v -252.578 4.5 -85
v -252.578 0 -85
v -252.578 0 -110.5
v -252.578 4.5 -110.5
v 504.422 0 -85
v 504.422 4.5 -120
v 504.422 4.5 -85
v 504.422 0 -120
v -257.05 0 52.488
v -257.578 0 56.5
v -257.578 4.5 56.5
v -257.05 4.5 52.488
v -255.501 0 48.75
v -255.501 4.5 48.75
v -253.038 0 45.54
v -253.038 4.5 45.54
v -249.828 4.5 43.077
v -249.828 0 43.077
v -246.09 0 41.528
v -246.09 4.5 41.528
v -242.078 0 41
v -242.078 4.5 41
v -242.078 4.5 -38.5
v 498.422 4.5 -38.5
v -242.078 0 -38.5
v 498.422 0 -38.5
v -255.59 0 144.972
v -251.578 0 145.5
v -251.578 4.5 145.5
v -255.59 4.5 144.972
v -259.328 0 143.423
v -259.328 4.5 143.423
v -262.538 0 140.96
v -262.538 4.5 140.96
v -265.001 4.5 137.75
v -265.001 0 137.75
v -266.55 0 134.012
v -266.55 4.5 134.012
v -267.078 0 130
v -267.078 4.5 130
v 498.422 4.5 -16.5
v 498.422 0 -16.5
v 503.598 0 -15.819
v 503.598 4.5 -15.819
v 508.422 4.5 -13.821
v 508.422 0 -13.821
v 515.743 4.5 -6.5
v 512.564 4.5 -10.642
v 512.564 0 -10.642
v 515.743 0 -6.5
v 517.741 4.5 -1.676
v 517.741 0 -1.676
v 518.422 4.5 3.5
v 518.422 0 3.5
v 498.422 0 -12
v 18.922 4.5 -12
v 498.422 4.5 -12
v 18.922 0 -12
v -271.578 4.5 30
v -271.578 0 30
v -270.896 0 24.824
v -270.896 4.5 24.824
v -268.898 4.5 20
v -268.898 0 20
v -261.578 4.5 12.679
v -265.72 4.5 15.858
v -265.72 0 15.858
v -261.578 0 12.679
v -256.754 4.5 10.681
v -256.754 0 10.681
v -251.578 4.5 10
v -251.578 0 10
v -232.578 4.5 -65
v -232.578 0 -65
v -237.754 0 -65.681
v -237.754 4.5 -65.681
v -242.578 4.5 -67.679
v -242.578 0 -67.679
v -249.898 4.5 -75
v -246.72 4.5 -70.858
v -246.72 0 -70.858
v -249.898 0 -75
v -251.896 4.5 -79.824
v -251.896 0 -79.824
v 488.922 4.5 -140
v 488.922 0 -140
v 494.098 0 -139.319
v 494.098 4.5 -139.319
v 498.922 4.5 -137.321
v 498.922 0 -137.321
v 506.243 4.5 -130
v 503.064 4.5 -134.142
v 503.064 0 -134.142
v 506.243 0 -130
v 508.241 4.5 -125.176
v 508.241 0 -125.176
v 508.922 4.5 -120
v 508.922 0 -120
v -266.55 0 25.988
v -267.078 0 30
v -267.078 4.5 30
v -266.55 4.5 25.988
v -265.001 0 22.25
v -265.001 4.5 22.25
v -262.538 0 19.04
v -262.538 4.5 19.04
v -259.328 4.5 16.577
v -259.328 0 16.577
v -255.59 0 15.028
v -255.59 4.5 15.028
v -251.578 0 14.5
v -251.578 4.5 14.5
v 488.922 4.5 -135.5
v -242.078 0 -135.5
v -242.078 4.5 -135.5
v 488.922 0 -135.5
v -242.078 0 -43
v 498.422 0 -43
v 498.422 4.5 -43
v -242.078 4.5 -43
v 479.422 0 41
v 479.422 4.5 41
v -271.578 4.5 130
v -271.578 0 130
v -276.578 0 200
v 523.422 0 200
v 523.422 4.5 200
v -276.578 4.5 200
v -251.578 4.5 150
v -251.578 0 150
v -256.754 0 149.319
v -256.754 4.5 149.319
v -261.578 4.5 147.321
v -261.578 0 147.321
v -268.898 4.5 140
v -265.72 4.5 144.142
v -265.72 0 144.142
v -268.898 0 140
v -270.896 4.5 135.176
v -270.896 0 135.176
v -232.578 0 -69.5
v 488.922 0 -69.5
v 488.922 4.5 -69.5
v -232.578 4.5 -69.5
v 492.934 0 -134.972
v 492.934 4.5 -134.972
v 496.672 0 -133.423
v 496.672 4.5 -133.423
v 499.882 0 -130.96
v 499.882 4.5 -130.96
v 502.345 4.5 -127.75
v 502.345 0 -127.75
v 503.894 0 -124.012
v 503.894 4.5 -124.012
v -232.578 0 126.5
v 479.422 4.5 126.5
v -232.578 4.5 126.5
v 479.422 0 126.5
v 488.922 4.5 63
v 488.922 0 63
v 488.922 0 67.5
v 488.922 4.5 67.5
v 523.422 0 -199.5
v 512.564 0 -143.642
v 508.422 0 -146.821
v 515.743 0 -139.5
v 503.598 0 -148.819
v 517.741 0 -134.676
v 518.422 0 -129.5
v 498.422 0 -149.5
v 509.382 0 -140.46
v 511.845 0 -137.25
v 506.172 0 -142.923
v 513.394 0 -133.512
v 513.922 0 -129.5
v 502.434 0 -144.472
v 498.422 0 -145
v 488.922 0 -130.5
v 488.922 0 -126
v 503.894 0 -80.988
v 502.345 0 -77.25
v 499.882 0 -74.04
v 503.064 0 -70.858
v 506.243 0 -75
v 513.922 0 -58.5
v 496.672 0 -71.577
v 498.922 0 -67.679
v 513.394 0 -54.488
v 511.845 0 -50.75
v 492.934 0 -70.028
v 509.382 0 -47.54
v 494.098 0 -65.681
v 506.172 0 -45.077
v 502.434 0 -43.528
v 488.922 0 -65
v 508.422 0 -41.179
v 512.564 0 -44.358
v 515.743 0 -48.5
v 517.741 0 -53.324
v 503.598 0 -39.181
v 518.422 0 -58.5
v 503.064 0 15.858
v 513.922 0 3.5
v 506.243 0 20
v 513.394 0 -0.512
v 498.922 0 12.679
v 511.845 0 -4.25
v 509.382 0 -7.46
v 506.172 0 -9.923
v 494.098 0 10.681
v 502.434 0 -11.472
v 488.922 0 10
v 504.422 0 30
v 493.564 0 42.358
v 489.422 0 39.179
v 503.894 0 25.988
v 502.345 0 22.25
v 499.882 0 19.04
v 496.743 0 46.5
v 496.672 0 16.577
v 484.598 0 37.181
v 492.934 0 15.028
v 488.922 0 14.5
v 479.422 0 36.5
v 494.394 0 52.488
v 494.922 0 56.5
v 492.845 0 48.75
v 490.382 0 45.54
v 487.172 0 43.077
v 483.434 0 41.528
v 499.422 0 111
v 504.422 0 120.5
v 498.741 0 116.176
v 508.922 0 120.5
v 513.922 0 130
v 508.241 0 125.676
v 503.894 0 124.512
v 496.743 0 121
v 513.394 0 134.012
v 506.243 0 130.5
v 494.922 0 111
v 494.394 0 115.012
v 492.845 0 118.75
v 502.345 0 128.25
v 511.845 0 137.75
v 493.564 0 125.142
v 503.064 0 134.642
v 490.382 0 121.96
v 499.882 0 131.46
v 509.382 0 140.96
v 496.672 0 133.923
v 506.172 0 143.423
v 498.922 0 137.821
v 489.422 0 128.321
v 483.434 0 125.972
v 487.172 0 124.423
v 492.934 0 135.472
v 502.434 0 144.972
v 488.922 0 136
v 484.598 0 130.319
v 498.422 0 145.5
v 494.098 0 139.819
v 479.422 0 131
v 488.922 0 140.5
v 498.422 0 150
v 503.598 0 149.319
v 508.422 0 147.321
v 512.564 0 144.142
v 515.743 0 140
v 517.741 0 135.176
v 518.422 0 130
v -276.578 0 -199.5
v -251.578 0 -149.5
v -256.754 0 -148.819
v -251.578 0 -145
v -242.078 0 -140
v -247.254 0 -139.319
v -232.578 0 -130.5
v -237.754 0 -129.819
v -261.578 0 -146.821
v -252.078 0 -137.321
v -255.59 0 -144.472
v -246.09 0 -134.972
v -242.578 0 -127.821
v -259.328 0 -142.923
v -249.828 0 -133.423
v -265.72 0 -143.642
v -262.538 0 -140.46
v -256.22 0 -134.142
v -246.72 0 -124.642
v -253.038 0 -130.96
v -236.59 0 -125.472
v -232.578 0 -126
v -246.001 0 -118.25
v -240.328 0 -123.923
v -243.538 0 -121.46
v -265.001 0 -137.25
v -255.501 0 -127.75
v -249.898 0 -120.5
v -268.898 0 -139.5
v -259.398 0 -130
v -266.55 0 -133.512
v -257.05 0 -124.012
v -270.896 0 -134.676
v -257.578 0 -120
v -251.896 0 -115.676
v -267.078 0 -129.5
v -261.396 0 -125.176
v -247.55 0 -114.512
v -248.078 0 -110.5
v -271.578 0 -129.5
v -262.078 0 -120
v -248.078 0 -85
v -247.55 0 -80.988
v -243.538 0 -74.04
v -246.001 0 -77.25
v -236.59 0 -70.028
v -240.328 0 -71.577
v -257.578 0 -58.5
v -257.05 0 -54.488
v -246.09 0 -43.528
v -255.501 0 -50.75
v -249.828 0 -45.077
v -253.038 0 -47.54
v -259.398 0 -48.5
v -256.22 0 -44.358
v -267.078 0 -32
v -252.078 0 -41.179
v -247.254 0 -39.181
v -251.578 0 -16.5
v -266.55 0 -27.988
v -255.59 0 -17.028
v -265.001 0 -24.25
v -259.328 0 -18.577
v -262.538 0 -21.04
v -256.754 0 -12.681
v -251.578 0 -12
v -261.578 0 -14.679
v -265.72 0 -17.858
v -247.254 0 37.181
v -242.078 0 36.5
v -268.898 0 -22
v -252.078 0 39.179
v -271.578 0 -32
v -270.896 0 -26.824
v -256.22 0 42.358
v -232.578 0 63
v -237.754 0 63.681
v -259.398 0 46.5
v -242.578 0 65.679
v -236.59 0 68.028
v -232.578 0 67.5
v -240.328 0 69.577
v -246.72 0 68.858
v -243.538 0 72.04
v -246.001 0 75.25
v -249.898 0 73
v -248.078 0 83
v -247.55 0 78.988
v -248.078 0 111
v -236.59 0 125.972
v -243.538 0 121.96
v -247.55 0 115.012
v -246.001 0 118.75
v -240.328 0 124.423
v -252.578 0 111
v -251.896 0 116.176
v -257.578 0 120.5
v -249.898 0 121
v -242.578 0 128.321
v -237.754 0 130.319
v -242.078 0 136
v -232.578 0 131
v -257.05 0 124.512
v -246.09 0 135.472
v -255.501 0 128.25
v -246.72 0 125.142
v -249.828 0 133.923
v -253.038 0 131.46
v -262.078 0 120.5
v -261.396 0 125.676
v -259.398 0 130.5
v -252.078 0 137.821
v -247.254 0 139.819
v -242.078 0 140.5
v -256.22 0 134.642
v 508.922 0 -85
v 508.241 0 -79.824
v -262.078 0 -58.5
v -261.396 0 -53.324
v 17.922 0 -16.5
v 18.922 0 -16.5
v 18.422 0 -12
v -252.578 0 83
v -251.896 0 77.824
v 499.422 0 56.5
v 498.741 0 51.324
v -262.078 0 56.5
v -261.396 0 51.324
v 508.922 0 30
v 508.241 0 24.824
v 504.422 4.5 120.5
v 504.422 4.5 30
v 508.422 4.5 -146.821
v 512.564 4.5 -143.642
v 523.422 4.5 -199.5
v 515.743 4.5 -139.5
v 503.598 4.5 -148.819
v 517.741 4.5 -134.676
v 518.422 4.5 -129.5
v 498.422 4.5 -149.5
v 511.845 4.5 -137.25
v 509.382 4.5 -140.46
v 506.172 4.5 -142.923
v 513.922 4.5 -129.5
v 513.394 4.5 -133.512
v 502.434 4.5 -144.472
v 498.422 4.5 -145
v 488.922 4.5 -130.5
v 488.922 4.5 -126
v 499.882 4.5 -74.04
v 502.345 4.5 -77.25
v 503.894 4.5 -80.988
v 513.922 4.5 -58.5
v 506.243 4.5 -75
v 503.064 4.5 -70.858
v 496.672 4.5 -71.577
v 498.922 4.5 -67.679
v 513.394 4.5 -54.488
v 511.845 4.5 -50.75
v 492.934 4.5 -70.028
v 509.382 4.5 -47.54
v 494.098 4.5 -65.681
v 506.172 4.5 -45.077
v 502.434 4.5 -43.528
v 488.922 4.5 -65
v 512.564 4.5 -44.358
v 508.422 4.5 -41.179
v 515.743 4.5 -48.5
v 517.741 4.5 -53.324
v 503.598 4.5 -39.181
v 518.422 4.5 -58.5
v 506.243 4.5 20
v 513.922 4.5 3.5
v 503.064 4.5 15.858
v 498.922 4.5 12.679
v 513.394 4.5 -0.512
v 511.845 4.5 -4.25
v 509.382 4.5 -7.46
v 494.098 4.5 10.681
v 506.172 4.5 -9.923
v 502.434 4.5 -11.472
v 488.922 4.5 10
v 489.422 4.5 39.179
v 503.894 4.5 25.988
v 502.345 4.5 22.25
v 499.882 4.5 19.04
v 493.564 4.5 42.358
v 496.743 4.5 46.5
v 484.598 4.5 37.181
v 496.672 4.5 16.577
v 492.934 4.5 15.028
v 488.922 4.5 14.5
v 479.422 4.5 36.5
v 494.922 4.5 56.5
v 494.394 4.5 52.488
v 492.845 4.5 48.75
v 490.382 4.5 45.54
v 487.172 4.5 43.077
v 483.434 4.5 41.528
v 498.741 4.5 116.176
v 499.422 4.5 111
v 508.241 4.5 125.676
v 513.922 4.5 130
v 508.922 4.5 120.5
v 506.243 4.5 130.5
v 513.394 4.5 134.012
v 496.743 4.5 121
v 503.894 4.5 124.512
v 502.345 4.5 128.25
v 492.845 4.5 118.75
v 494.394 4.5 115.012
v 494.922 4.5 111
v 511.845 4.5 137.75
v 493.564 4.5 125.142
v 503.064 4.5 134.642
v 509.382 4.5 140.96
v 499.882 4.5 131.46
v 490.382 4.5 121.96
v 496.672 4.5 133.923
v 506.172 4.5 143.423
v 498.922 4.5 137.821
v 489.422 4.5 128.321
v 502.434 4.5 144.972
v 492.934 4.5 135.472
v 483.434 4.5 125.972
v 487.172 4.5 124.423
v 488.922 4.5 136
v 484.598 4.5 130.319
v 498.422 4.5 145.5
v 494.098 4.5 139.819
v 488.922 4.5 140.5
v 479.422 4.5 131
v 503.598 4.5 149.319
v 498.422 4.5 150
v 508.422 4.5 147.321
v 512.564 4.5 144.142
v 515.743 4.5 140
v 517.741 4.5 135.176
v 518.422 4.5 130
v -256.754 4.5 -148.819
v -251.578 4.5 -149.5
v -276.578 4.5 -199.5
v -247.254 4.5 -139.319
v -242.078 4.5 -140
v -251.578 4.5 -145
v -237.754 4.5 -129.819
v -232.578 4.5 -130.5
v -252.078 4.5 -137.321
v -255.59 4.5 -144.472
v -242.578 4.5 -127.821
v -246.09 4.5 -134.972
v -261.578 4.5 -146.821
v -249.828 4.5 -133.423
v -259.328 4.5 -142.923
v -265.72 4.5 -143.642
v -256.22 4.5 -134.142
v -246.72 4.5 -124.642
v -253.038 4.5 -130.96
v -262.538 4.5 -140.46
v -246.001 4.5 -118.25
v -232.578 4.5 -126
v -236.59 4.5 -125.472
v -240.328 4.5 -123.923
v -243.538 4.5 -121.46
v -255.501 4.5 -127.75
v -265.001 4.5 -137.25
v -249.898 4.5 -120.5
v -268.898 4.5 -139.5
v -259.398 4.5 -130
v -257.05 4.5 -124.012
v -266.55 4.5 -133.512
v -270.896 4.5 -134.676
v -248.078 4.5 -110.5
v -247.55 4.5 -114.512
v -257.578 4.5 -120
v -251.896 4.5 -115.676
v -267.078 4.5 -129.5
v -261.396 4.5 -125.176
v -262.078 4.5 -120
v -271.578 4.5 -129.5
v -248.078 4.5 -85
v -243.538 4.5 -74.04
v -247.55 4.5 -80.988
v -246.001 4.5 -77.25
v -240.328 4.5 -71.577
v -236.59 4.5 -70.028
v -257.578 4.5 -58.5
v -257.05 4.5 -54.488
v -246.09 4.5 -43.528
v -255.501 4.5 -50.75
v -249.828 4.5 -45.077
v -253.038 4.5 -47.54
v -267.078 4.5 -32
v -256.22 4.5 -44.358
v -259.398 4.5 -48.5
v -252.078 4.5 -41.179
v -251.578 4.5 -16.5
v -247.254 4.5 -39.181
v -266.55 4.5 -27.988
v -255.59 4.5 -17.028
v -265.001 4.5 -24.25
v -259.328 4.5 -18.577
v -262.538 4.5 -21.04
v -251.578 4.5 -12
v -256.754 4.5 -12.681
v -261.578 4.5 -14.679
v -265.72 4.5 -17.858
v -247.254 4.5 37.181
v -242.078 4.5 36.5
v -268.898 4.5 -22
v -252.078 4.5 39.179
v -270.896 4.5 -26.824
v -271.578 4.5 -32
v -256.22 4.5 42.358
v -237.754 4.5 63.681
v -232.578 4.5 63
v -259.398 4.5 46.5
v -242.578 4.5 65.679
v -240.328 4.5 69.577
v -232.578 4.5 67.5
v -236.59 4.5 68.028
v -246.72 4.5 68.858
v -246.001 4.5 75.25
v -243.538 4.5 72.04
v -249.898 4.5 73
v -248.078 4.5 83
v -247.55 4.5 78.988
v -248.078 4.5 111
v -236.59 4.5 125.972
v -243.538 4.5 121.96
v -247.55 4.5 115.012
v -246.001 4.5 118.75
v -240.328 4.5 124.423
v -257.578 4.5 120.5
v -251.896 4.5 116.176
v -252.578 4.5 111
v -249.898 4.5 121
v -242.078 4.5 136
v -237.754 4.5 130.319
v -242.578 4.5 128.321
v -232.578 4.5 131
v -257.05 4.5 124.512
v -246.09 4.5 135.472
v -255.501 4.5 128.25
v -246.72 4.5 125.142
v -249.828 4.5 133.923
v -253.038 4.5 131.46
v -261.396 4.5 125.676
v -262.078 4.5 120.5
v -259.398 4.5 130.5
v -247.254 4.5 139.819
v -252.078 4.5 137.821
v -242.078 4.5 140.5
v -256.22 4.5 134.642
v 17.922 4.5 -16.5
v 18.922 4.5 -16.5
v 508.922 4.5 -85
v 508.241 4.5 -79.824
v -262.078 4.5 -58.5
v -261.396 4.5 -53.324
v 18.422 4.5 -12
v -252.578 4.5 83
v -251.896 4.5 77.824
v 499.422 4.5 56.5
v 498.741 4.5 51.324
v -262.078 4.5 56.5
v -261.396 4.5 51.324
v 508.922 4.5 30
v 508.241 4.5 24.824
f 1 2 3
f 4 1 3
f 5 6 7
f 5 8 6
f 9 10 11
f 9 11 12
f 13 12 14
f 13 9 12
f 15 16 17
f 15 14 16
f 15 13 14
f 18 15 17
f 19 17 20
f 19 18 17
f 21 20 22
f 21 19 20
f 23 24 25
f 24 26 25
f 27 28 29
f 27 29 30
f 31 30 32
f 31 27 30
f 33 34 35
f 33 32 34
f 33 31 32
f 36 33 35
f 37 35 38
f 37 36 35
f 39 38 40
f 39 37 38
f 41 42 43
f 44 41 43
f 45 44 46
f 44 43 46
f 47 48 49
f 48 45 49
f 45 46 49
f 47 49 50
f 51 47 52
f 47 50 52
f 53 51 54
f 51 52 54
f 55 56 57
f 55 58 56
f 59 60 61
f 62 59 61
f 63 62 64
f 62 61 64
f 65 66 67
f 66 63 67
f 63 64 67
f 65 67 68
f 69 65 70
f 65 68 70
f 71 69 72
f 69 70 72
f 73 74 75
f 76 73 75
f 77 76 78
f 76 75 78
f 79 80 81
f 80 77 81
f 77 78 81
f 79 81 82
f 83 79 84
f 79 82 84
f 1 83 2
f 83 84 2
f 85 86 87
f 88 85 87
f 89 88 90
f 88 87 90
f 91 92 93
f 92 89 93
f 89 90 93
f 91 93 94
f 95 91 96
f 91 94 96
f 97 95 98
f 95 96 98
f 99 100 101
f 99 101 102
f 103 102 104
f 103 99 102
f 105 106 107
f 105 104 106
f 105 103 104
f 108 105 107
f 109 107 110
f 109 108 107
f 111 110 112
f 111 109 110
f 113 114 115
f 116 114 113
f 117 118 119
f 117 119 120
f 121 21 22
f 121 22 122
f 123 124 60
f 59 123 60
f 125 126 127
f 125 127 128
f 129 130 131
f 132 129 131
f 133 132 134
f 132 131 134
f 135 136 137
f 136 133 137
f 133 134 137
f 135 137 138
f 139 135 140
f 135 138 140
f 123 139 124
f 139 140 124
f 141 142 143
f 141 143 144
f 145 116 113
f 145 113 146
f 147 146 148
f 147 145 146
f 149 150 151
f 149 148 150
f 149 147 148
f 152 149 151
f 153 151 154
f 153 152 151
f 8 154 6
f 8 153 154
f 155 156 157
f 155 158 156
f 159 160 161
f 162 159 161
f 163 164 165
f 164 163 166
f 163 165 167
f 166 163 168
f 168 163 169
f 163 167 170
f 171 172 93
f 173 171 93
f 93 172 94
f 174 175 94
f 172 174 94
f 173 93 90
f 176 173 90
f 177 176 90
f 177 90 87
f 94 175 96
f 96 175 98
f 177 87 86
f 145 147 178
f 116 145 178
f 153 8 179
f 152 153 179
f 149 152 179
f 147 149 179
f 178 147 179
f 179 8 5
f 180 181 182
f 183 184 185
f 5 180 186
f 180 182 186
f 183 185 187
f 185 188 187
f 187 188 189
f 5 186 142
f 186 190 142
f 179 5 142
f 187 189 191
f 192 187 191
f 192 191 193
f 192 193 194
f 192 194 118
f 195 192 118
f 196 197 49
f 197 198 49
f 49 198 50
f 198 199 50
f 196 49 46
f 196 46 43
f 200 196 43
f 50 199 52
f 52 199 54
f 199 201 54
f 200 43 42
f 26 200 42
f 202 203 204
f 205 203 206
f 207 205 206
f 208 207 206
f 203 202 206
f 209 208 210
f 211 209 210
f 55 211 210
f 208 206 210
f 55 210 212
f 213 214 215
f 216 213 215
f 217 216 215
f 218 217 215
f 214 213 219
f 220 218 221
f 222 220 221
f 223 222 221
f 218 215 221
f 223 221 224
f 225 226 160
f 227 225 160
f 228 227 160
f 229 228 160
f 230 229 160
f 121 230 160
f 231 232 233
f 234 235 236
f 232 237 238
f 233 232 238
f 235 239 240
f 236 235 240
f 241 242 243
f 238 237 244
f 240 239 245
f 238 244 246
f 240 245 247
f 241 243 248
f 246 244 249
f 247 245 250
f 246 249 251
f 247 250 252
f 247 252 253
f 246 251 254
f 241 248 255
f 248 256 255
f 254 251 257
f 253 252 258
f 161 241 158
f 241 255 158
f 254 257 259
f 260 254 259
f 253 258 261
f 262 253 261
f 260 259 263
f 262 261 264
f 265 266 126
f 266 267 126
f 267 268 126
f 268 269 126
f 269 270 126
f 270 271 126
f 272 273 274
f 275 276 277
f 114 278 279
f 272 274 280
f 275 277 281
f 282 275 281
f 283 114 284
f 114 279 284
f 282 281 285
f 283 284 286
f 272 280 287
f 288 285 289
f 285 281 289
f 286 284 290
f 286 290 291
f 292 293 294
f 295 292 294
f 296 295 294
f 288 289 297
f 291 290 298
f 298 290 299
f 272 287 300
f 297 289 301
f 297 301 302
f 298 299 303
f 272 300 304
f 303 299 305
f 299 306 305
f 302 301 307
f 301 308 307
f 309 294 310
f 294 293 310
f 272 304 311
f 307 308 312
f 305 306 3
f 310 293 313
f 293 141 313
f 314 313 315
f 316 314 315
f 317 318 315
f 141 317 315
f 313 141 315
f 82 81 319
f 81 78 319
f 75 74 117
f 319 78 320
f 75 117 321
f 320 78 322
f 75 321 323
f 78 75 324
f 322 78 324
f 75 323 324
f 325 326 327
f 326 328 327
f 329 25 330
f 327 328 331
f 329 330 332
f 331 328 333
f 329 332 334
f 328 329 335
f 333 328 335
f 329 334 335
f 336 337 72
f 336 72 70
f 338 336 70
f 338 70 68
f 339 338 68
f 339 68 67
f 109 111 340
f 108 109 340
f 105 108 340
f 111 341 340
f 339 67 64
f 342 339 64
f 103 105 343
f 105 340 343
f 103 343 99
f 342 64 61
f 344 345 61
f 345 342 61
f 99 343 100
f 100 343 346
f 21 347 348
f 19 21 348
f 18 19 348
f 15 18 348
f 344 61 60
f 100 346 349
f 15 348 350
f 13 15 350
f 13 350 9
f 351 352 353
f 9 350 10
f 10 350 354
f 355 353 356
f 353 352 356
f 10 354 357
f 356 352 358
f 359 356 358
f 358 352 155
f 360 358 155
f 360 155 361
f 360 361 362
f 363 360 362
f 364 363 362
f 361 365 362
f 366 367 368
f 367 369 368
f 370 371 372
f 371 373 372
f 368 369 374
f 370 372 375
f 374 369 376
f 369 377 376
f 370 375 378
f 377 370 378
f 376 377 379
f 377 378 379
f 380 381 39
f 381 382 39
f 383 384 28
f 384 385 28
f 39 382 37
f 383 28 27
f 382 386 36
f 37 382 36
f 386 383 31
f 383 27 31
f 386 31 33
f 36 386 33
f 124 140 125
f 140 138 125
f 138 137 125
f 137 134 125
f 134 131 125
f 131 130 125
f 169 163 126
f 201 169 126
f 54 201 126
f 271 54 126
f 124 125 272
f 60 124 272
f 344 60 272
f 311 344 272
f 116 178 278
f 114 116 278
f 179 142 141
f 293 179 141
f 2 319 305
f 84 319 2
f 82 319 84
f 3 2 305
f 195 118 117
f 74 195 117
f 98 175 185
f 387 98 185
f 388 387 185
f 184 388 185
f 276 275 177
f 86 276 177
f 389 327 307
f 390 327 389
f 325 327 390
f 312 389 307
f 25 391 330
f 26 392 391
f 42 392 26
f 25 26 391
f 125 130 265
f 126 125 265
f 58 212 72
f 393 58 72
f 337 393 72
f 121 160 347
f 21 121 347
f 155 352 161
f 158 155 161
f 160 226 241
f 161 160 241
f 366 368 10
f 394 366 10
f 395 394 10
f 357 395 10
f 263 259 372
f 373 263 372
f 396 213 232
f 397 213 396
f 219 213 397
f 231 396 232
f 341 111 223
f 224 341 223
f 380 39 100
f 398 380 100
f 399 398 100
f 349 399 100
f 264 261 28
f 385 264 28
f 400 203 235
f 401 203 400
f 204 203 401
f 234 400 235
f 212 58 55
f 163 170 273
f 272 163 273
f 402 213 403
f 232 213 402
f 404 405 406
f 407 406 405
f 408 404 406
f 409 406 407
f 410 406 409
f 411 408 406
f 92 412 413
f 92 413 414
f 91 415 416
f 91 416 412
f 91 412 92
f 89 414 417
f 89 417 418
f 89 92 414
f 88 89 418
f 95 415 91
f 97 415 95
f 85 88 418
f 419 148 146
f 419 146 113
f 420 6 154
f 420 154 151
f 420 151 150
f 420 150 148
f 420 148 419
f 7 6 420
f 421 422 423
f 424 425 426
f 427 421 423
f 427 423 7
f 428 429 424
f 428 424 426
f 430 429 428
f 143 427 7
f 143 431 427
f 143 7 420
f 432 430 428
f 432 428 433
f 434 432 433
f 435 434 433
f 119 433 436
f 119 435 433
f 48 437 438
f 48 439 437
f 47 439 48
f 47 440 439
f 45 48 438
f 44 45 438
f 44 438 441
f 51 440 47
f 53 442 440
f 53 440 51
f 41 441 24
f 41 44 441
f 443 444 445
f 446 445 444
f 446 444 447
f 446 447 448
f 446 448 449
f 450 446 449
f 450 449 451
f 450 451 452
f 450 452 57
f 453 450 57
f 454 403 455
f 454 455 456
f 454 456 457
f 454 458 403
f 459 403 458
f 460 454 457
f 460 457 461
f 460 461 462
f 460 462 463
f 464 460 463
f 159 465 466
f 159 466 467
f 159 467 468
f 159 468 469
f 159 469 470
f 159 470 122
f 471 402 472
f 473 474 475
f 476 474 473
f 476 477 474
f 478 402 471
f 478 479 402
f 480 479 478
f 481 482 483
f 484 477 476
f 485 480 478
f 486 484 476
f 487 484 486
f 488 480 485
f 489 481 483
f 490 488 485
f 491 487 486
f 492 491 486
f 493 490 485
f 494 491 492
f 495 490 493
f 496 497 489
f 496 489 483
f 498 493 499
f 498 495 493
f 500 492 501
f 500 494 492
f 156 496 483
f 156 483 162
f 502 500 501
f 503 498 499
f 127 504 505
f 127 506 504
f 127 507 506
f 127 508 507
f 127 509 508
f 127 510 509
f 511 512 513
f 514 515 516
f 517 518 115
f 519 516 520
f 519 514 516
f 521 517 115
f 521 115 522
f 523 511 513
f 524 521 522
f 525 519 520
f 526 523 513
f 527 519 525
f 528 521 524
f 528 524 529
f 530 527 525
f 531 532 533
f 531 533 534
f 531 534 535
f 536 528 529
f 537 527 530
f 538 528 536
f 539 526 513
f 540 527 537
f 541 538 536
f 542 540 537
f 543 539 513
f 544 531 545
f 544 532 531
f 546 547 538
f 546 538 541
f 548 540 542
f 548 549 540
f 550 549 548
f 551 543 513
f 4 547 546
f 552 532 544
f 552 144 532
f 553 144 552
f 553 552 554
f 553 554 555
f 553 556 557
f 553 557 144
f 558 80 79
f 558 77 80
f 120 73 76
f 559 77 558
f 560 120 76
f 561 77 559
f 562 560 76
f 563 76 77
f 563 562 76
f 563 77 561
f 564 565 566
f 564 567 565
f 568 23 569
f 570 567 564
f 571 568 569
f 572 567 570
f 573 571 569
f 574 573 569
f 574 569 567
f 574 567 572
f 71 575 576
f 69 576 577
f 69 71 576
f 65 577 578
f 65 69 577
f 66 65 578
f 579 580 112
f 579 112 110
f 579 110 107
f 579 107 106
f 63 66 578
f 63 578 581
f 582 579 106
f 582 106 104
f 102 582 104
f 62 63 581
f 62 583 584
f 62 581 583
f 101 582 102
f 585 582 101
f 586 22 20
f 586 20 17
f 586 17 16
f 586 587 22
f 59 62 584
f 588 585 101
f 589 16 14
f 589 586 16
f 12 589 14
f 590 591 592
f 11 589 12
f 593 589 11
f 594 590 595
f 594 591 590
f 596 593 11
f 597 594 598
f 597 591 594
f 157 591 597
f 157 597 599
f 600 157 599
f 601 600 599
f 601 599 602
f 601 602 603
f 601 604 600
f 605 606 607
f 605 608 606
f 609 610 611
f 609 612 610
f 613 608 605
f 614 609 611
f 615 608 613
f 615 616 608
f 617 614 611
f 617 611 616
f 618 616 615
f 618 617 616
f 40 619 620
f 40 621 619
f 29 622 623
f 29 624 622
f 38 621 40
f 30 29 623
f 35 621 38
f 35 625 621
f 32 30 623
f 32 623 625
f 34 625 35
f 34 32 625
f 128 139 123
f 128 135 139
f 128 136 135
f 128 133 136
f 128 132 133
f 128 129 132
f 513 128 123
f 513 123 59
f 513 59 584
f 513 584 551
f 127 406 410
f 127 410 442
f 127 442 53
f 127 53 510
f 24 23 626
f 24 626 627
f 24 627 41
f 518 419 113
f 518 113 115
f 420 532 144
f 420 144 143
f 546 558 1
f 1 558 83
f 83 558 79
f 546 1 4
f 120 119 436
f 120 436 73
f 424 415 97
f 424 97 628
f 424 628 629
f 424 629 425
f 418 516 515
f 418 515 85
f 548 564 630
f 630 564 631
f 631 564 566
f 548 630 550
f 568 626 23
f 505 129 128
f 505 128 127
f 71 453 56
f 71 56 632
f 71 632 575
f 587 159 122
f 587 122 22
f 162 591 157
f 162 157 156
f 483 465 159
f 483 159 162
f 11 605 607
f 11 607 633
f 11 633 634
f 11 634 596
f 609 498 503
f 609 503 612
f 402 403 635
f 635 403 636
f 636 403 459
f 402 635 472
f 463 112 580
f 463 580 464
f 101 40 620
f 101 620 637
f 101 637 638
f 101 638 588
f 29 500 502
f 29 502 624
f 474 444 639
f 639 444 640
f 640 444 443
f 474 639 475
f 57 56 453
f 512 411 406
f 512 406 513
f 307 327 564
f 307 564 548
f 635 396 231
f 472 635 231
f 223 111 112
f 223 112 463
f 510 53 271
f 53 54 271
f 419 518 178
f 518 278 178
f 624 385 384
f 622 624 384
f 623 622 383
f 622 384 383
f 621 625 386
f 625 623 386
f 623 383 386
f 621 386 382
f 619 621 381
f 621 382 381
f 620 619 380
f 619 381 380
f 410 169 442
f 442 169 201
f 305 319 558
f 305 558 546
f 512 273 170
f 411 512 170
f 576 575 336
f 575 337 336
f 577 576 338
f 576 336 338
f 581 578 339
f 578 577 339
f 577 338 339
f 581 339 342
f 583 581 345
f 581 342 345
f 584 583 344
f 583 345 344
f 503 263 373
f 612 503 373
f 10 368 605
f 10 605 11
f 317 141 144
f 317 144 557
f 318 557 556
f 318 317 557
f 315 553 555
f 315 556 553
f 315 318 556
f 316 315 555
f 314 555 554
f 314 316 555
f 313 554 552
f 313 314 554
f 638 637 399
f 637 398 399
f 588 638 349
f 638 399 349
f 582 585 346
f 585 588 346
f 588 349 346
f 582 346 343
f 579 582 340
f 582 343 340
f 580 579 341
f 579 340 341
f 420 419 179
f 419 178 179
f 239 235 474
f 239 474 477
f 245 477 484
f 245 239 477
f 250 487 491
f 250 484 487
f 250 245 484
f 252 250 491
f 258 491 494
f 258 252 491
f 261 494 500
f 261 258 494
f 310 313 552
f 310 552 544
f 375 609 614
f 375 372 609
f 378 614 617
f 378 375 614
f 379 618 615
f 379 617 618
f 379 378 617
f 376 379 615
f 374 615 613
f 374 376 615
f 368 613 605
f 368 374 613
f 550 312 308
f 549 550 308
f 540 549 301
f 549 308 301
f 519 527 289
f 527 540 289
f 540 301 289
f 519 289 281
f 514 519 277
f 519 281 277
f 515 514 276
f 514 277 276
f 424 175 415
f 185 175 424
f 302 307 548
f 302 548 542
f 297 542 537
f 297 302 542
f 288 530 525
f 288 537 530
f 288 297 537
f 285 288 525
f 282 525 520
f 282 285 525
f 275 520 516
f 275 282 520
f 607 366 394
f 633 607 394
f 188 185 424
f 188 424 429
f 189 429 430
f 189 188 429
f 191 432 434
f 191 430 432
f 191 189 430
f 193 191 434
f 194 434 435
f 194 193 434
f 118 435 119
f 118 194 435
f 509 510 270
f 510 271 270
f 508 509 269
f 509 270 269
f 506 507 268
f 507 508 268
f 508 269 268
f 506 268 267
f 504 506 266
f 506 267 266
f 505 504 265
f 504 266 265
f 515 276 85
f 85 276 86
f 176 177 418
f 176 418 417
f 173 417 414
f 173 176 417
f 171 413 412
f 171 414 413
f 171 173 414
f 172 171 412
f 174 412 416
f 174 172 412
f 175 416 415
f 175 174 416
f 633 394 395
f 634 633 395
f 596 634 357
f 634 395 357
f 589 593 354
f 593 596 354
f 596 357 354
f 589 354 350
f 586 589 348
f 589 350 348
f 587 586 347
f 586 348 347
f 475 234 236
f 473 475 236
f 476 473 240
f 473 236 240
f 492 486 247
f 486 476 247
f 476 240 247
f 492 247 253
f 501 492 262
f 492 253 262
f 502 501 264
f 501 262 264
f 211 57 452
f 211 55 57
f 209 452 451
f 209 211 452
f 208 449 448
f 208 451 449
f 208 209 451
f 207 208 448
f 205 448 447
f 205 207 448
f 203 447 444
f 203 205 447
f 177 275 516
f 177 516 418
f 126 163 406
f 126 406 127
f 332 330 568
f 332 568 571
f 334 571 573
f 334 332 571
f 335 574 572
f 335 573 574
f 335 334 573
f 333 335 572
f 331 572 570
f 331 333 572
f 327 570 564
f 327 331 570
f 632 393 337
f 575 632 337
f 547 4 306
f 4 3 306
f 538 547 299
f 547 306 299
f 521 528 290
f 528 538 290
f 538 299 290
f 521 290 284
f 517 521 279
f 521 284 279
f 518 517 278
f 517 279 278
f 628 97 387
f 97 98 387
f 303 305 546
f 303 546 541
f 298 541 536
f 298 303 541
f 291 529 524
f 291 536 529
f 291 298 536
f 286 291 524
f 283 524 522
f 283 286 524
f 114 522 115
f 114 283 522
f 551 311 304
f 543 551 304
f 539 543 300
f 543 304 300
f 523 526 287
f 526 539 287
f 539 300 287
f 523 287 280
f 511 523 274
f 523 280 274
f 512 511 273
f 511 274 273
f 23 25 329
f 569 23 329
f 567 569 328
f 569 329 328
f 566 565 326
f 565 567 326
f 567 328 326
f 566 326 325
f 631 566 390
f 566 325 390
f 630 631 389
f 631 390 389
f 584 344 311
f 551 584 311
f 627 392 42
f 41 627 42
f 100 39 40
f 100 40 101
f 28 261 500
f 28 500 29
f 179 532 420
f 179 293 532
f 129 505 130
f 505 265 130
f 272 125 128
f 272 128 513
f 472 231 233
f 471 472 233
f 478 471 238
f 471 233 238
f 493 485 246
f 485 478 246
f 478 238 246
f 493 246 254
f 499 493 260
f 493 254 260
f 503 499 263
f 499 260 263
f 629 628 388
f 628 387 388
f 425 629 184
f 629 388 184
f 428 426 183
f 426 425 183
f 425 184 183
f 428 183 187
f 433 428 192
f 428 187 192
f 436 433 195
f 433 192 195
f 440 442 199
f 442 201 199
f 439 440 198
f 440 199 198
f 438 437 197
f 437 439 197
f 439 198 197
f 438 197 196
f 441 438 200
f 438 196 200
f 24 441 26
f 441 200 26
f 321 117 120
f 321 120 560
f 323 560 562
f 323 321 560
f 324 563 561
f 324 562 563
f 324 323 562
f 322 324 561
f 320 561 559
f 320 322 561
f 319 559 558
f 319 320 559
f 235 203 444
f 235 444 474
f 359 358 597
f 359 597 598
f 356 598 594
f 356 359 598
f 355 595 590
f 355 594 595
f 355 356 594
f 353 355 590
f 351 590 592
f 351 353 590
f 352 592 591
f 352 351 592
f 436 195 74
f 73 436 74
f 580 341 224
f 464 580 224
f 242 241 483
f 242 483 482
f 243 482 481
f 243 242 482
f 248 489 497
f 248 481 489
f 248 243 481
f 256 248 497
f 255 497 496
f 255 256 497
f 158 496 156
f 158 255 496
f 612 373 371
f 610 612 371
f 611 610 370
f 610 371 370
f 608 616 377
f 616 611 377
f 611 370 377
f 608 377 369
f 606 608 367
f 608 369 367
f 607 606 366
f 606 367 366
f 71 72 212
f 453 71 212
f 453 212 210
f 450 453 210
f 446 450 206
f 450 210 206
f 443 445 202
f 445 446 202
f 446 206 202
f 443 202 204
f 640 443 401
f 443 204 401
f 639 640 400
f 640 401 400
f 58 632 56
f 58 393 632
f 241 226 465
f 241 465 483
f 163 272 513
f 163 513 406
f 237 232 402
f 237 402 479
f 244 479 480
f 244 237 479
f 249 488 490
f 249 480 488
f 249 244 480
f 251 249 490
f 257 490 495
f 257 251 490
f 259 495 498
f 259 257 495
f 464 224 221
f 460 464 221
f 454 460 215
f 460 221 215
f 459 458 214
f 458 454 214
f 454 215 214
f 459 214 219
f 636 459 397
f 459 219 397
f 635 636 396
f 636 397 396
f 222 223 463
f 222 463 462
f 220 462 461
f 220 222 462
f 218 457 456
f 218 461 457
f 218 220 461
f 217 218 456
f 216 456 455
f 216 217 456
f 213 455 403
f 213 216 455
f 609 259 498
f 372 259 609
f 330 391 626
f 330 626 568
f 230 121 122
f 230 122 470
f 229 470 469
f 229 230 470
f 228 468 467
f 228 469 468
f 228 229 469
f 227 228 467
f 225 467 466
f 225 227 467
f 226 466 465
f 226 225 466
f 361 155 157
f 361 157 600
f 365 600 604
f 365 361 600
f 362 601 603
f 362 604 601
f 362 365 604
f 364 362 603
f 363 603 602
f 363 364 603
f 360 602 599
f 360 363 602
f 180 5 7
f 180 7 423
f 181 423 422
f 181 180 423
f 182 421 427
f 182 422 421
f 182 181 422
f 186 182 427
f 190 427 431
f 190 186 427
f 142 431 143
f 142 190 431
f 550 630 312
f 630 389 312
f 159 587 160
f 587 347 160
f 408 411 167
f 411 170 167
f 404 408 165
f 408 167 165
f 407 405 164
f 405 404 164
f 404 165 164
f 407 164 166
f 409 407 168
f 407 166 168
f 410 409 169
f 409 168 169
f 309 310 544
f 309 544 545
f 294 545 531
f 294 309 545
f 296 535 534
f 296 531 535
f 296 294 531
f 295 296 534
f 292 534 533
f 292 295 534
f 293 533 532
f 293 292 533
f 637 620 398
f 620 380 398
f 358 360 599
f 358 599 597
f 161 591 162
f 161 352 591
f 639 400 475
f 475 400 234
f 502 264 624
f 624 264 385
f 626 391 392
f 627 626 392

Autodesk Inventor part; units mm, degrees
ref_plane "YZ Plane" through (0, 0, 0) normal (1, 0, 0) x (0, 1, 0)
ref_plane "XZ Plane" through (0, 0, 0) normal (0, 1, 0) x (-1, 0, 0)
ref_plane "XY Plane" through (0, 0, 0) normal (0, 0, 1) x (1, 0, 0)
sketch "Sketch1" plane through (0, 0, 0) normal (0, 1, 0) x (-1, 0, 0)
  line L0 (-17.9221, -16.5) -> (-498.4221, -16.5)
  line L1 (-518.4221, 3.5) -> (-518.4221, 130)
  line L2 (-498.4221, 150) -> (251.5779, 150)
  line L3 (271.5779, 130) -> (271.5779, 30)
  line L4 (-18.4221, -12) -> (-498.4221, -12)
  line L5 (-513.9221, 3.5) -> (-513.9221, 130)
  line L6 (-498.4221, 145.5) -> (251.5779, 145.5)
  line L7 (267.0779, 130) -> (267.0779, 30)
  line L8 (251.5779, 14.5) -> (-488.9221, 14.5)
  line L9 (-504.4221, 30) -> (-504.4221, 120.5)
  line L10 (251.5779, 10) -> (-488.9221, 10)
  line L11 (-508.9221, 30) -> (-508.9221, 120.5)
  line L12 (-488.9221, 136) -> (242.0779, 136)
  line L13 (-488.9221, 140.5) -> (242.0779, 140.5)
  line L14 (257.5779, 120.5) -> (257.5779, 56.5)
  line L15 (242.0779, 41) -> (-479.4221, 41)
  line L16 (262.0779, 120.5) -> (262.0779, 56.5)
  line L17 (242.0779, 36.5) -> (-479.4221, 36.5)
  line L18 (-494.9221, 56.5) -> (-494.9221, 111)
  line L19 (-479.4221, 126.5) -> (232.5779, 126.5)
  line L20 (248.0779, 111) -> (248.0779, 83)
  line L21 (232.5779, 67.5) -> (-488.9221, 67.5)
  line L22 (-499.4221, 56.5) -> (-499.4221, 111)
  line L23 (-479.4221, 131) -> (232.5779, 131)
  line L24 (252.5779, 111) -> (252.5779, 83)
  line L25 (232.5779, 63) -> (-488.9221, 63)
  line L26 (-122.9221, 150) -> (-122.9221, -150) construction
  line L27 (-18.9221, -12) -> (251.5779, -12)
  line L28 (271.5779, -32) -> (271.5779, -129.5)
  line L29 (251.5779, -149.5) -> (-498.4221, -149.5)
  line L30 (-518.4221, -129.5) -> (-518.4221, -58.5)
  line L31 (-18.9221, -16.5) -> (251.5779, -16.5)
  line L32 (267.0779, -32) -> (267.0779, -129.5)
  line L33 (251.5779, -145) -> (-498.4221, -145)
  line L34 (-498.4221, -38.5) -> (242.0779, -38.5)
  line L35 (262.0779, -58.5) -> (262.0779, -120)
  line L36 (242.0779, -140) -> (-488.9221, -140)
  line L37 (-513.9221, -129.5) -> (-513.9221, -58.5)
  line L38 (-498.4221, -43) -> (242.0779, -43)
  line L39 (257.5779, -58.5) -> (257.5779, -120)
  line L40 (242.0779, -135.5) -> (-488.9221, -135.5)
  line L41 (-504.4221, -120) -> (-504.4221, -85)
  line L42 (-508.9221, -120) -> (-508.9221, -85)
  line L43 (-488.9221, -65) -> (232.5779, -65)
  line L44 (252.5779, -85) -> (252.5779, -110.5)
  line L45 (-488.9221, -69.5) -> (232.5779, -69.5)
  line L46 (248.0779, -85) -> (248.0779, -110.5)
  line L47 (232.5779, -126) -> (-488.9221, -126)
  line L48 (232.5779, -130.5) -> (-488.9221, -130.5)
  line L49 (276.5779, 200.5) -> (276.5779, -199.5)
  line L50 (276.5779, -199.5) -> (-523.4221, -199.5)
  line L51 (-523.4221, -199.5) -> (-523.4221, 200)
  line L52 (-523.4221, 200) -> (276.5779, 200)
  line L53 (276.5779, 200) -> (276.5779, -199.5)
  arc A0 (251.5779, -149.5) -> (271.5779, -129.5) centre (251.5779, -129.5) ccw
  arc A1 (251.5779, -145) -> (267.0779, -129.5) centre (251.5779, -129.5) ccw
  arc A2 (242.0779, -135.5) -> (257.5779, -120) centre (242.0779, -120) ccw
  arc A3 (242.0779, -140) -> (262.0779, -120) centre (242.0779, -120) ccw
  arc A4 (232.5779, -130.5) -> (252.5779, -110.5) centre (232.5779, -110.5) ccw
  arc A5 (232.5779, -126) -> (248.0779, -110.5) centre (232.5779, -110.5) ccw
  arc A6 (248.0779, -85) -> (232.5779, -69.5) centre (232.5779, -85) ccw
  arc A7 (252.5779, -85) -> (232.5779, -65) centre (232.5779, -85) ccw
  line L54 (266.0656, -58.5) -> (242.0779, -58.5) construction
  line L55 (242.0779, -58.5) -> (242.0779, -27) construction
  arc A8 (257.5779, -58.5) -> (242.0779, -43) centre (242.0779, -58.5) ccw
  arc A9 (262.0779, -58.5) -> (242.0779, -38.5) centre (242.0779, -58.5) ccw
  line L56 (251.5779, -3.7302) -> (251.5779, -32) construction
  line L57 (251.5779, -32) -> (272.6377, -32) construction
  arc A10 (267.0779, -32) -> (251.5779, -16.5) centre (251.5779, -32) ccw
  arc A11 (271.5779, -32) -> (251.5779, -12) centre (251.5779, -32) ccw
  arc A12 (-518.4221, -129.5) -> (-498.4221, -149.5) centre (-498.4221, -129.5) ccw
  arc A13 (-513.9221, -129.5) -> (-498.4221, -145) centre (-498.4221, -129.5) ccw
  arc A14 (-508.9221, -120) -> (-488.9221, -140) centre (-488.9221, -120) ccw
  line L58 (-488.9221, -130.5) -> (-488.9221, -126)
  arc A15 (-504.4221, -120) -> (-488.9221, -135.5) centre (-488.9221, -120) ccw
  arc A16 (-488.9221, -65) -> (-508.9221, -85) centre (-488.9221, -85) ccw
  arc A17 (-488.9221, -69.5) -> (-504.4221, -85) centre (-488.9221, -85) ccw
  arc A18 (-498.4221, -43) -> (-513.9221, -58.5) centre (-498.4221, -58.5) ccw
  arc A19 (-498.4221, -38.5) -> (-518.4221, -58.5) centre (-498.4221, -58.5) ccw
  line L59 (-488.9221, 63) -> (-488.9221, 67.5)
  arc A20 (-518.4221, 3.5) -> (-498.4221, -16.5) centre (-498.4221, 3.5) ccw
  arc A21 (-513.9221, 3.5) -> (-498.4221, -12) centre (-498.4221, 3.5) ccw
  arc A22 (-508.9221, 30) -> (-488.9221, 10) centre (-488.9221, 30) ccw
  arc A23 (-504.4221, 30) -> (-488.9221, 14.5) centre (-488.9221, 30) ccw
  arc A24 (-499.4221, 56.5) -> (-479.4221, 36.5) centre (-479.4221, 56.5) ccw
  arc A25 (-494.9221, 56.5) -> (-479.4221, 41) centre (-479.4221, 56.5) ccw
  arc A26 (-479.4221, 126.5) -> (-494.9221, 111) centre (-479.4221, 111) ccw
  arc A27 (-479.4221, 131) -> (-499.4221, 111) centre (-479.4221, 111) ccw
  arc A28 (-488.9221, 136) -> (-504.4221, 120.5) centre (-488.9221, 120.5) ccw
  arc A29 (-488.9221, 140.5) -> (-508.9221, 120.5) centre (-488.9221, 120.5) ccw
  arc A30 (-498.4221, 145.5) -> (-513.9221, 130) centre (-498.4221, 130) ccw
  arc A31 (-498.4221, 150) -> (-518.4221, 130) centre (-498.4221, 130) ccw
  arc A32 (251.5779, 10) -> (271.5779, 30) centre (251.5779, 30) ccw
  arc A33 (251.5779, 14.5) -> (267.0779, 30) centre (251.5779, 30) ccw
  arc A34 (242.0779, 41) -> (257.5779, 56.5) centre (242.0779, 56.5) ccw
  arc A35 (242.0779, 36.5) -> (262.0779, 56.5) centre (242.0779, 56.5) ccw
  arc A36 (232.5779, 63) -> (252.5779, 83) centre (232.5779, 83) ccw
  arc A37 (232.5779, 67.5) -> (248.0779, 83) centre (232.5779, 83) ccw
  arc A38 (248.0779, 111) -> (232.5779, 126.5) centre (232.5779, 111) ccw
  arc A39 (252.5779, 111) -> (232.5779, 131) centre (232.5779, 111) ccw
  arc A40 (257.5779, 120.5) -> (242.0779, 136) centre (242.0779, 120.5) ccw
  arc A41 (262.0779, 120.5) -> (242.0779, 140.5) centre (242.0779, 120.5) ccw
  arc A42 (267.0779, 130) -> (251.5779, 145.5) centre (251.5779, 130) ccw
  arc A43 (271.5779, 130) -> (251.5779, 150) centre (251.5779, 130) ccw
  point P0 (-228.4221, 0)
  point P1 (276.5779, 200)
  point P2 (257.5779, -126)
  dimension "d2" = 4.5
  dimension "d3" = 4.5
  dimension "d4" = 4.5
  dimension "d5" = 5
  dimension "d6" = 5
  dimension "d7" = 4.5
  dimension "d8" = 4.5
  dimension "d9" = 4.5
  dimension "d10" = 5
  dimension "d11" = 790
  dimension "d12" = 22
  dimension "d13" = 4.5
  dimension "d14" = 4.5
  dimension "d15" = 22
  dimension "d16" = 5
  dimension "d17" = 5
  dimension "d18" = 4.5
  dimension "d19" = 5
  dimension "d20" = 22
  dimension "d21" = 4.5
  dimension "d22" = 4.5
  dimension "d23" = 4.5
  dimension "d30" = 4.5
  dimension "d31" = 4.5
  dimension "d32" = 4.5
  dimension "d34" = 500
  dimension "d35" = 4.5
  dimension "d36" = 4.5
  dimension "d38" = 4.5
  dimension "d39" = 22
  dimension "d40" = 4.5
  dimension "d41" = 5
  dimension "d42" = 4.5
  dimension "d43" = 4.5
  dimension "d44" = 4.5
  dimension "d46" = 22
  dimension "d47" = 5
  dimension "d48" = 4.5
  dimension "d49" = 5
  dimension "d63" = 400
  dimension "d64" = 50
  dimension "d65" = 5
  dimension "d68" = 5
  dimension "d80" = 4.5
  dimension "d81" = 0
  dimension "d103" = 5
extrude "Extrusion3" add sketch "Sketch1" along normal blind 4.5
sketch "Sketch2" plane through (0, 4.5, 0) normal (0, 1, 0) x (1, 0, 0)
  circle A0 centre (373.4204, -170.5) radius 4
  circle A1 centre (473.4246, -170.5) radius 4
  circle A2 centre (-226.5779, -170.5) radius 4
  circle A3 centre (-128.1236, -170.5) radius 4
  circle A4 centre (-28.1236, -170.5) radius 4
  circle A5 centre (71.8764, -170.5) radius 4
  circle A6 centre (171.8764, -170.5) radius 4
  circle A7 centre (271.8764, -170.5) radius 4
  line L0 (373.4204, -170.5) -> (473.4246, -170.5) construction
  line L1 (473.4246, -170.5) -> (523.4221, -170.5) construction
  line L2 (-226.5779, -170.5) -> (-276.5779, -170.5) construction
  line L3 (-226.5779, -170.5) -> (373.4204, -170.5) construction
  line L4 (-108.1236, -175.5) -> (-108.1236, -172)
  line L5 (-108.1236, -172) -> (-48.1236, -172)
  line L6 (-48.1236, -172) -> (-48.1236, -175.5)
  line L7 (-48.1236, -175.5) -> (-108.1236, -175.5)
  line L8 (351.8764, -175.5) -> (351.8764, -172)
  line L9 (351.8764, -172) -> (291.8764, -172)
  line L10 (291.8764, -172) -> (291.8764, -175.5)
  line L11 (291.8764, -175.5) -> (351.8764, -175.5)
  line L12 (151.8764, -175.5) -> (151.8764, -172)
  line L13 (151.8764, -172) -> (91.8764, -172)
  line L14 (91.8764, -172) -> (91.8764, -175.5)
  line L15 (91.8764, -175.5) -> (151.8764, -175.5)
  line L16 (190.1572, -175.5) -> (190.1572, -172)
  line L17 (190.1572, -172) -> (250.1572, -172)
  line L18 (250.1572, -172) -> (250.1572, -175.5)
  line L19 (250.1572, -175.5) -> (190.1572, -175.5)
  line L20 (-8.1236, -175.5) -> (-8.1236, -172)
  line L21 (-8.1236, -172) -> (51.8764, -172)
  line L22 (51.8764, -172) -> (51.8764, -175.5)
  line L23 (51.8764, -175.5) -> (-8.1236, -175.5)
  line L24 (-206.5779, -175.5) -> (-206.5779, -172)
  line L25 (-206.5779, -172) -> (-146.5779, -172)
  line L26 (-146.5779, -172) -> (-146.5779, -175.5)
  line L27 (-146.5779, -175.5) -> (-206.5779, -175.5)
  line L28 (393.4204, -172) -> (393.4204, -175.5)
  line L29 (393.4204, -175.5) -> (453.4204, -175.5)
  line L30 (453.4204, -175.5) -> (453.4204, -172)
  line L31 (453.4204, -172) -> (393.4204, -172)
  line L32 (493.4246, -172) -> (493.4246, -175.5)
  line L33 (493.4246, -175.5) -> (523.4221, -175.5)
  line L34 (523.4221, -172) -> (493.4246, -172)
  line L35 (-276.5779, -172) -> (-246.5779, -172)
  line L36 (-246.5779, -172) -> (-246.5779, -175.5)
  line L37 (-246.5779, -175.5) -> (-276.5779, -175.5)
  line L38 (-146.5779, 171) -> (-146.5779, 174.5)
  line L39 (-206.5779, 171) -> (-146.5779, 171)
  circle A8 centre (-128.1236, 169.5) radius 4
  line L40 (-48.1236, 171) -> (-48.1236, 174.5)
  line L41 (-48.1236, 174.5) -> (-108.1236, 174.5)
  circle A9 centre (-28.1236, 169.5) radius 4
  line L42 (-8.1236, 174.5) -> (-8.1236, 171)
  line L43 (-8.1236, 171) -> (51.8764, 171)
  line L44 (-226.5779, 169.5) -> (373.4204, 169.5) construction
  line L45 (51.8764, 174.5) -> (-8.1236, 174.5)
  line L46 (51.8764, 171) -> (51.8764, 174.5)
  line L47 (-108.1236, 171) -> (-48.1236, 171)
  circle A10 centre (-226.5779, 169.5) radius 4
  line L48 (-108.1236, 174.5) -> (-108.1236, 171)
  line L49 (-146.5779, 174.5) -> (-206.5779, 174.5)
  circle A11 centre (71.8764, 169.5) radius 4
  circle A12 centre (171.8764, 169.5) radius 4
  circle A13 centre (373.4204, 169.5) radius 4
  circle A14 centre (473.4246, 169.5) radius 4
  circle A15 centre (271.8764, 169.5) radius 4
  line L50 (250.1572, 171) -> (250.1572, 174.5)
  line L51 (190.1572, 171) -> (250.1572, 171)
  line L52 (250.1572, 174.5) -> (190.1572, 174.5)
  line L53 (190.1572, 174.5) -> (190.1572, 171)
  line L54 (151.8764, 174.5) -> (151.8764, 171)
  line L55 (151.8764, 171) -> (91.8764, 171)
  line L56 (91.8764, 174.5) -> (151.8764, 174.5)
  line L57 (91.8764, 171) -> (91.8764, 174.5)
  line L58 (-226.5779, 169.5) -> (-276.5779, 169.5) construction
  line L59 (-206.5779, 174.5) -> (-206.5779, 171)
  line L60 (-246.5779, 171) -> (-246.5779, 174.5)
  line L61 (-276.5779, 171) -> (-246.5779, 171)
  line L62 (-246.5779, 174.5) -> (-276.5779, 174.5)
  line L63 (373.4204, 169.5) -> (473.4246, 169.5) construction
  line L64 (473.4246, 169.5) -> (523.4221, 169.5) construction
  line L65 (351.8764, 174.5) -> (351.8764, 171)
  line L66 (351.8764, 171) -> (291.8764, 171)
  line L67 (291.8764, 171) -> (291.8764, 174.5)
  line L68 (291.8764, 174.5) -> (351.8764, 174.5)
  line L69 (393.4204, 171) -> (393.4204, 174.5)
  line L70 (393.4204, 174.5) -> (453.4204, 174.5)
  line L71 (453.4204, 174.5) -> (453.4204, 171)
  line L72 (493.4246, 171) -> (493.4246, 174.5)
  line L73 (493.4246, 174.5) -> (523.4221, 174.5)
  line L74 (523.4221, 171) -> (493.4246, 171)
  line L75 (453.4204, 171) -> (393.4204, 171)
  line L76 (-276.5779, 199.5) -> (-276.5779, -200) construction
  line L77 (-276.5779, 199.5) -> (-246.6531, 199.5) construction
  line L78 (-246.6531, 199.5) -> (-246.6531, 174.5) construction
  line L79 (-246.6531, 174.5) -> (-276.5779, 174.5) construction
  line L80 (-276.5779, 174.5) -> (-276.5779, 199.5) construction
  dimension "d166" = 3.5
  dimension "d167" = 60
  dimension "d168" = 20
  dimension "d169" = 3.5
  dimension "d170" = 3.5
  dimension "d171" = 20
  dimension "d172" = 20
  dimension "d173" = 60
  dimension "d174" = 60
  dimension "d175" = 3.5
  dimension "d176" = 18.2808
  dimension "d177" = 60
  dimension "d178" = 3.5
  dimension "d179" = 20
  dimension "d180" = 60
  dimension "d181" = 3.5
  dimension "d182" = 60
  dimension "d183" = 20
  dimension "d184" = 3.5
  dimension "d185" = 20
  dimension "d186" = 60
  dimension "d187" = 3.5
  dimension "d188" = 20
  dimension "d189" = 3.5
  dimension "d190" = 20
  dimension "d191" = 25
equation "\"d6\" = d26"
equation "\"d10\" = d26"
equation "\"d15\" = d28"
equation "\"d16\" = d26"
equation "\"d19\" = d25"
equation "\"d20\" = d28"
equation "\"d34\" = 0.5 * d52"
equation "\"d41\" = d53"
equation "\"d46\" = d54"
equation "\"d47\" = d53"
equation "\"d49\" = d53"
equation "\"d25\" = 5"
equation "\"d26\" = 5"
equation "\"d28\" = -1.2 * d25 + 0.2 * d29"
equation "\"d51\" = 5"
equation "\"d53\" = 5"
equation "\"d54\" = -1.2 * d51 + 0.2 * d55"
equation "\"d29\" = 140"
equation "\"d55\" = 140"
equation "\"d52\" = 1000"
properties part number "coil_layer"
